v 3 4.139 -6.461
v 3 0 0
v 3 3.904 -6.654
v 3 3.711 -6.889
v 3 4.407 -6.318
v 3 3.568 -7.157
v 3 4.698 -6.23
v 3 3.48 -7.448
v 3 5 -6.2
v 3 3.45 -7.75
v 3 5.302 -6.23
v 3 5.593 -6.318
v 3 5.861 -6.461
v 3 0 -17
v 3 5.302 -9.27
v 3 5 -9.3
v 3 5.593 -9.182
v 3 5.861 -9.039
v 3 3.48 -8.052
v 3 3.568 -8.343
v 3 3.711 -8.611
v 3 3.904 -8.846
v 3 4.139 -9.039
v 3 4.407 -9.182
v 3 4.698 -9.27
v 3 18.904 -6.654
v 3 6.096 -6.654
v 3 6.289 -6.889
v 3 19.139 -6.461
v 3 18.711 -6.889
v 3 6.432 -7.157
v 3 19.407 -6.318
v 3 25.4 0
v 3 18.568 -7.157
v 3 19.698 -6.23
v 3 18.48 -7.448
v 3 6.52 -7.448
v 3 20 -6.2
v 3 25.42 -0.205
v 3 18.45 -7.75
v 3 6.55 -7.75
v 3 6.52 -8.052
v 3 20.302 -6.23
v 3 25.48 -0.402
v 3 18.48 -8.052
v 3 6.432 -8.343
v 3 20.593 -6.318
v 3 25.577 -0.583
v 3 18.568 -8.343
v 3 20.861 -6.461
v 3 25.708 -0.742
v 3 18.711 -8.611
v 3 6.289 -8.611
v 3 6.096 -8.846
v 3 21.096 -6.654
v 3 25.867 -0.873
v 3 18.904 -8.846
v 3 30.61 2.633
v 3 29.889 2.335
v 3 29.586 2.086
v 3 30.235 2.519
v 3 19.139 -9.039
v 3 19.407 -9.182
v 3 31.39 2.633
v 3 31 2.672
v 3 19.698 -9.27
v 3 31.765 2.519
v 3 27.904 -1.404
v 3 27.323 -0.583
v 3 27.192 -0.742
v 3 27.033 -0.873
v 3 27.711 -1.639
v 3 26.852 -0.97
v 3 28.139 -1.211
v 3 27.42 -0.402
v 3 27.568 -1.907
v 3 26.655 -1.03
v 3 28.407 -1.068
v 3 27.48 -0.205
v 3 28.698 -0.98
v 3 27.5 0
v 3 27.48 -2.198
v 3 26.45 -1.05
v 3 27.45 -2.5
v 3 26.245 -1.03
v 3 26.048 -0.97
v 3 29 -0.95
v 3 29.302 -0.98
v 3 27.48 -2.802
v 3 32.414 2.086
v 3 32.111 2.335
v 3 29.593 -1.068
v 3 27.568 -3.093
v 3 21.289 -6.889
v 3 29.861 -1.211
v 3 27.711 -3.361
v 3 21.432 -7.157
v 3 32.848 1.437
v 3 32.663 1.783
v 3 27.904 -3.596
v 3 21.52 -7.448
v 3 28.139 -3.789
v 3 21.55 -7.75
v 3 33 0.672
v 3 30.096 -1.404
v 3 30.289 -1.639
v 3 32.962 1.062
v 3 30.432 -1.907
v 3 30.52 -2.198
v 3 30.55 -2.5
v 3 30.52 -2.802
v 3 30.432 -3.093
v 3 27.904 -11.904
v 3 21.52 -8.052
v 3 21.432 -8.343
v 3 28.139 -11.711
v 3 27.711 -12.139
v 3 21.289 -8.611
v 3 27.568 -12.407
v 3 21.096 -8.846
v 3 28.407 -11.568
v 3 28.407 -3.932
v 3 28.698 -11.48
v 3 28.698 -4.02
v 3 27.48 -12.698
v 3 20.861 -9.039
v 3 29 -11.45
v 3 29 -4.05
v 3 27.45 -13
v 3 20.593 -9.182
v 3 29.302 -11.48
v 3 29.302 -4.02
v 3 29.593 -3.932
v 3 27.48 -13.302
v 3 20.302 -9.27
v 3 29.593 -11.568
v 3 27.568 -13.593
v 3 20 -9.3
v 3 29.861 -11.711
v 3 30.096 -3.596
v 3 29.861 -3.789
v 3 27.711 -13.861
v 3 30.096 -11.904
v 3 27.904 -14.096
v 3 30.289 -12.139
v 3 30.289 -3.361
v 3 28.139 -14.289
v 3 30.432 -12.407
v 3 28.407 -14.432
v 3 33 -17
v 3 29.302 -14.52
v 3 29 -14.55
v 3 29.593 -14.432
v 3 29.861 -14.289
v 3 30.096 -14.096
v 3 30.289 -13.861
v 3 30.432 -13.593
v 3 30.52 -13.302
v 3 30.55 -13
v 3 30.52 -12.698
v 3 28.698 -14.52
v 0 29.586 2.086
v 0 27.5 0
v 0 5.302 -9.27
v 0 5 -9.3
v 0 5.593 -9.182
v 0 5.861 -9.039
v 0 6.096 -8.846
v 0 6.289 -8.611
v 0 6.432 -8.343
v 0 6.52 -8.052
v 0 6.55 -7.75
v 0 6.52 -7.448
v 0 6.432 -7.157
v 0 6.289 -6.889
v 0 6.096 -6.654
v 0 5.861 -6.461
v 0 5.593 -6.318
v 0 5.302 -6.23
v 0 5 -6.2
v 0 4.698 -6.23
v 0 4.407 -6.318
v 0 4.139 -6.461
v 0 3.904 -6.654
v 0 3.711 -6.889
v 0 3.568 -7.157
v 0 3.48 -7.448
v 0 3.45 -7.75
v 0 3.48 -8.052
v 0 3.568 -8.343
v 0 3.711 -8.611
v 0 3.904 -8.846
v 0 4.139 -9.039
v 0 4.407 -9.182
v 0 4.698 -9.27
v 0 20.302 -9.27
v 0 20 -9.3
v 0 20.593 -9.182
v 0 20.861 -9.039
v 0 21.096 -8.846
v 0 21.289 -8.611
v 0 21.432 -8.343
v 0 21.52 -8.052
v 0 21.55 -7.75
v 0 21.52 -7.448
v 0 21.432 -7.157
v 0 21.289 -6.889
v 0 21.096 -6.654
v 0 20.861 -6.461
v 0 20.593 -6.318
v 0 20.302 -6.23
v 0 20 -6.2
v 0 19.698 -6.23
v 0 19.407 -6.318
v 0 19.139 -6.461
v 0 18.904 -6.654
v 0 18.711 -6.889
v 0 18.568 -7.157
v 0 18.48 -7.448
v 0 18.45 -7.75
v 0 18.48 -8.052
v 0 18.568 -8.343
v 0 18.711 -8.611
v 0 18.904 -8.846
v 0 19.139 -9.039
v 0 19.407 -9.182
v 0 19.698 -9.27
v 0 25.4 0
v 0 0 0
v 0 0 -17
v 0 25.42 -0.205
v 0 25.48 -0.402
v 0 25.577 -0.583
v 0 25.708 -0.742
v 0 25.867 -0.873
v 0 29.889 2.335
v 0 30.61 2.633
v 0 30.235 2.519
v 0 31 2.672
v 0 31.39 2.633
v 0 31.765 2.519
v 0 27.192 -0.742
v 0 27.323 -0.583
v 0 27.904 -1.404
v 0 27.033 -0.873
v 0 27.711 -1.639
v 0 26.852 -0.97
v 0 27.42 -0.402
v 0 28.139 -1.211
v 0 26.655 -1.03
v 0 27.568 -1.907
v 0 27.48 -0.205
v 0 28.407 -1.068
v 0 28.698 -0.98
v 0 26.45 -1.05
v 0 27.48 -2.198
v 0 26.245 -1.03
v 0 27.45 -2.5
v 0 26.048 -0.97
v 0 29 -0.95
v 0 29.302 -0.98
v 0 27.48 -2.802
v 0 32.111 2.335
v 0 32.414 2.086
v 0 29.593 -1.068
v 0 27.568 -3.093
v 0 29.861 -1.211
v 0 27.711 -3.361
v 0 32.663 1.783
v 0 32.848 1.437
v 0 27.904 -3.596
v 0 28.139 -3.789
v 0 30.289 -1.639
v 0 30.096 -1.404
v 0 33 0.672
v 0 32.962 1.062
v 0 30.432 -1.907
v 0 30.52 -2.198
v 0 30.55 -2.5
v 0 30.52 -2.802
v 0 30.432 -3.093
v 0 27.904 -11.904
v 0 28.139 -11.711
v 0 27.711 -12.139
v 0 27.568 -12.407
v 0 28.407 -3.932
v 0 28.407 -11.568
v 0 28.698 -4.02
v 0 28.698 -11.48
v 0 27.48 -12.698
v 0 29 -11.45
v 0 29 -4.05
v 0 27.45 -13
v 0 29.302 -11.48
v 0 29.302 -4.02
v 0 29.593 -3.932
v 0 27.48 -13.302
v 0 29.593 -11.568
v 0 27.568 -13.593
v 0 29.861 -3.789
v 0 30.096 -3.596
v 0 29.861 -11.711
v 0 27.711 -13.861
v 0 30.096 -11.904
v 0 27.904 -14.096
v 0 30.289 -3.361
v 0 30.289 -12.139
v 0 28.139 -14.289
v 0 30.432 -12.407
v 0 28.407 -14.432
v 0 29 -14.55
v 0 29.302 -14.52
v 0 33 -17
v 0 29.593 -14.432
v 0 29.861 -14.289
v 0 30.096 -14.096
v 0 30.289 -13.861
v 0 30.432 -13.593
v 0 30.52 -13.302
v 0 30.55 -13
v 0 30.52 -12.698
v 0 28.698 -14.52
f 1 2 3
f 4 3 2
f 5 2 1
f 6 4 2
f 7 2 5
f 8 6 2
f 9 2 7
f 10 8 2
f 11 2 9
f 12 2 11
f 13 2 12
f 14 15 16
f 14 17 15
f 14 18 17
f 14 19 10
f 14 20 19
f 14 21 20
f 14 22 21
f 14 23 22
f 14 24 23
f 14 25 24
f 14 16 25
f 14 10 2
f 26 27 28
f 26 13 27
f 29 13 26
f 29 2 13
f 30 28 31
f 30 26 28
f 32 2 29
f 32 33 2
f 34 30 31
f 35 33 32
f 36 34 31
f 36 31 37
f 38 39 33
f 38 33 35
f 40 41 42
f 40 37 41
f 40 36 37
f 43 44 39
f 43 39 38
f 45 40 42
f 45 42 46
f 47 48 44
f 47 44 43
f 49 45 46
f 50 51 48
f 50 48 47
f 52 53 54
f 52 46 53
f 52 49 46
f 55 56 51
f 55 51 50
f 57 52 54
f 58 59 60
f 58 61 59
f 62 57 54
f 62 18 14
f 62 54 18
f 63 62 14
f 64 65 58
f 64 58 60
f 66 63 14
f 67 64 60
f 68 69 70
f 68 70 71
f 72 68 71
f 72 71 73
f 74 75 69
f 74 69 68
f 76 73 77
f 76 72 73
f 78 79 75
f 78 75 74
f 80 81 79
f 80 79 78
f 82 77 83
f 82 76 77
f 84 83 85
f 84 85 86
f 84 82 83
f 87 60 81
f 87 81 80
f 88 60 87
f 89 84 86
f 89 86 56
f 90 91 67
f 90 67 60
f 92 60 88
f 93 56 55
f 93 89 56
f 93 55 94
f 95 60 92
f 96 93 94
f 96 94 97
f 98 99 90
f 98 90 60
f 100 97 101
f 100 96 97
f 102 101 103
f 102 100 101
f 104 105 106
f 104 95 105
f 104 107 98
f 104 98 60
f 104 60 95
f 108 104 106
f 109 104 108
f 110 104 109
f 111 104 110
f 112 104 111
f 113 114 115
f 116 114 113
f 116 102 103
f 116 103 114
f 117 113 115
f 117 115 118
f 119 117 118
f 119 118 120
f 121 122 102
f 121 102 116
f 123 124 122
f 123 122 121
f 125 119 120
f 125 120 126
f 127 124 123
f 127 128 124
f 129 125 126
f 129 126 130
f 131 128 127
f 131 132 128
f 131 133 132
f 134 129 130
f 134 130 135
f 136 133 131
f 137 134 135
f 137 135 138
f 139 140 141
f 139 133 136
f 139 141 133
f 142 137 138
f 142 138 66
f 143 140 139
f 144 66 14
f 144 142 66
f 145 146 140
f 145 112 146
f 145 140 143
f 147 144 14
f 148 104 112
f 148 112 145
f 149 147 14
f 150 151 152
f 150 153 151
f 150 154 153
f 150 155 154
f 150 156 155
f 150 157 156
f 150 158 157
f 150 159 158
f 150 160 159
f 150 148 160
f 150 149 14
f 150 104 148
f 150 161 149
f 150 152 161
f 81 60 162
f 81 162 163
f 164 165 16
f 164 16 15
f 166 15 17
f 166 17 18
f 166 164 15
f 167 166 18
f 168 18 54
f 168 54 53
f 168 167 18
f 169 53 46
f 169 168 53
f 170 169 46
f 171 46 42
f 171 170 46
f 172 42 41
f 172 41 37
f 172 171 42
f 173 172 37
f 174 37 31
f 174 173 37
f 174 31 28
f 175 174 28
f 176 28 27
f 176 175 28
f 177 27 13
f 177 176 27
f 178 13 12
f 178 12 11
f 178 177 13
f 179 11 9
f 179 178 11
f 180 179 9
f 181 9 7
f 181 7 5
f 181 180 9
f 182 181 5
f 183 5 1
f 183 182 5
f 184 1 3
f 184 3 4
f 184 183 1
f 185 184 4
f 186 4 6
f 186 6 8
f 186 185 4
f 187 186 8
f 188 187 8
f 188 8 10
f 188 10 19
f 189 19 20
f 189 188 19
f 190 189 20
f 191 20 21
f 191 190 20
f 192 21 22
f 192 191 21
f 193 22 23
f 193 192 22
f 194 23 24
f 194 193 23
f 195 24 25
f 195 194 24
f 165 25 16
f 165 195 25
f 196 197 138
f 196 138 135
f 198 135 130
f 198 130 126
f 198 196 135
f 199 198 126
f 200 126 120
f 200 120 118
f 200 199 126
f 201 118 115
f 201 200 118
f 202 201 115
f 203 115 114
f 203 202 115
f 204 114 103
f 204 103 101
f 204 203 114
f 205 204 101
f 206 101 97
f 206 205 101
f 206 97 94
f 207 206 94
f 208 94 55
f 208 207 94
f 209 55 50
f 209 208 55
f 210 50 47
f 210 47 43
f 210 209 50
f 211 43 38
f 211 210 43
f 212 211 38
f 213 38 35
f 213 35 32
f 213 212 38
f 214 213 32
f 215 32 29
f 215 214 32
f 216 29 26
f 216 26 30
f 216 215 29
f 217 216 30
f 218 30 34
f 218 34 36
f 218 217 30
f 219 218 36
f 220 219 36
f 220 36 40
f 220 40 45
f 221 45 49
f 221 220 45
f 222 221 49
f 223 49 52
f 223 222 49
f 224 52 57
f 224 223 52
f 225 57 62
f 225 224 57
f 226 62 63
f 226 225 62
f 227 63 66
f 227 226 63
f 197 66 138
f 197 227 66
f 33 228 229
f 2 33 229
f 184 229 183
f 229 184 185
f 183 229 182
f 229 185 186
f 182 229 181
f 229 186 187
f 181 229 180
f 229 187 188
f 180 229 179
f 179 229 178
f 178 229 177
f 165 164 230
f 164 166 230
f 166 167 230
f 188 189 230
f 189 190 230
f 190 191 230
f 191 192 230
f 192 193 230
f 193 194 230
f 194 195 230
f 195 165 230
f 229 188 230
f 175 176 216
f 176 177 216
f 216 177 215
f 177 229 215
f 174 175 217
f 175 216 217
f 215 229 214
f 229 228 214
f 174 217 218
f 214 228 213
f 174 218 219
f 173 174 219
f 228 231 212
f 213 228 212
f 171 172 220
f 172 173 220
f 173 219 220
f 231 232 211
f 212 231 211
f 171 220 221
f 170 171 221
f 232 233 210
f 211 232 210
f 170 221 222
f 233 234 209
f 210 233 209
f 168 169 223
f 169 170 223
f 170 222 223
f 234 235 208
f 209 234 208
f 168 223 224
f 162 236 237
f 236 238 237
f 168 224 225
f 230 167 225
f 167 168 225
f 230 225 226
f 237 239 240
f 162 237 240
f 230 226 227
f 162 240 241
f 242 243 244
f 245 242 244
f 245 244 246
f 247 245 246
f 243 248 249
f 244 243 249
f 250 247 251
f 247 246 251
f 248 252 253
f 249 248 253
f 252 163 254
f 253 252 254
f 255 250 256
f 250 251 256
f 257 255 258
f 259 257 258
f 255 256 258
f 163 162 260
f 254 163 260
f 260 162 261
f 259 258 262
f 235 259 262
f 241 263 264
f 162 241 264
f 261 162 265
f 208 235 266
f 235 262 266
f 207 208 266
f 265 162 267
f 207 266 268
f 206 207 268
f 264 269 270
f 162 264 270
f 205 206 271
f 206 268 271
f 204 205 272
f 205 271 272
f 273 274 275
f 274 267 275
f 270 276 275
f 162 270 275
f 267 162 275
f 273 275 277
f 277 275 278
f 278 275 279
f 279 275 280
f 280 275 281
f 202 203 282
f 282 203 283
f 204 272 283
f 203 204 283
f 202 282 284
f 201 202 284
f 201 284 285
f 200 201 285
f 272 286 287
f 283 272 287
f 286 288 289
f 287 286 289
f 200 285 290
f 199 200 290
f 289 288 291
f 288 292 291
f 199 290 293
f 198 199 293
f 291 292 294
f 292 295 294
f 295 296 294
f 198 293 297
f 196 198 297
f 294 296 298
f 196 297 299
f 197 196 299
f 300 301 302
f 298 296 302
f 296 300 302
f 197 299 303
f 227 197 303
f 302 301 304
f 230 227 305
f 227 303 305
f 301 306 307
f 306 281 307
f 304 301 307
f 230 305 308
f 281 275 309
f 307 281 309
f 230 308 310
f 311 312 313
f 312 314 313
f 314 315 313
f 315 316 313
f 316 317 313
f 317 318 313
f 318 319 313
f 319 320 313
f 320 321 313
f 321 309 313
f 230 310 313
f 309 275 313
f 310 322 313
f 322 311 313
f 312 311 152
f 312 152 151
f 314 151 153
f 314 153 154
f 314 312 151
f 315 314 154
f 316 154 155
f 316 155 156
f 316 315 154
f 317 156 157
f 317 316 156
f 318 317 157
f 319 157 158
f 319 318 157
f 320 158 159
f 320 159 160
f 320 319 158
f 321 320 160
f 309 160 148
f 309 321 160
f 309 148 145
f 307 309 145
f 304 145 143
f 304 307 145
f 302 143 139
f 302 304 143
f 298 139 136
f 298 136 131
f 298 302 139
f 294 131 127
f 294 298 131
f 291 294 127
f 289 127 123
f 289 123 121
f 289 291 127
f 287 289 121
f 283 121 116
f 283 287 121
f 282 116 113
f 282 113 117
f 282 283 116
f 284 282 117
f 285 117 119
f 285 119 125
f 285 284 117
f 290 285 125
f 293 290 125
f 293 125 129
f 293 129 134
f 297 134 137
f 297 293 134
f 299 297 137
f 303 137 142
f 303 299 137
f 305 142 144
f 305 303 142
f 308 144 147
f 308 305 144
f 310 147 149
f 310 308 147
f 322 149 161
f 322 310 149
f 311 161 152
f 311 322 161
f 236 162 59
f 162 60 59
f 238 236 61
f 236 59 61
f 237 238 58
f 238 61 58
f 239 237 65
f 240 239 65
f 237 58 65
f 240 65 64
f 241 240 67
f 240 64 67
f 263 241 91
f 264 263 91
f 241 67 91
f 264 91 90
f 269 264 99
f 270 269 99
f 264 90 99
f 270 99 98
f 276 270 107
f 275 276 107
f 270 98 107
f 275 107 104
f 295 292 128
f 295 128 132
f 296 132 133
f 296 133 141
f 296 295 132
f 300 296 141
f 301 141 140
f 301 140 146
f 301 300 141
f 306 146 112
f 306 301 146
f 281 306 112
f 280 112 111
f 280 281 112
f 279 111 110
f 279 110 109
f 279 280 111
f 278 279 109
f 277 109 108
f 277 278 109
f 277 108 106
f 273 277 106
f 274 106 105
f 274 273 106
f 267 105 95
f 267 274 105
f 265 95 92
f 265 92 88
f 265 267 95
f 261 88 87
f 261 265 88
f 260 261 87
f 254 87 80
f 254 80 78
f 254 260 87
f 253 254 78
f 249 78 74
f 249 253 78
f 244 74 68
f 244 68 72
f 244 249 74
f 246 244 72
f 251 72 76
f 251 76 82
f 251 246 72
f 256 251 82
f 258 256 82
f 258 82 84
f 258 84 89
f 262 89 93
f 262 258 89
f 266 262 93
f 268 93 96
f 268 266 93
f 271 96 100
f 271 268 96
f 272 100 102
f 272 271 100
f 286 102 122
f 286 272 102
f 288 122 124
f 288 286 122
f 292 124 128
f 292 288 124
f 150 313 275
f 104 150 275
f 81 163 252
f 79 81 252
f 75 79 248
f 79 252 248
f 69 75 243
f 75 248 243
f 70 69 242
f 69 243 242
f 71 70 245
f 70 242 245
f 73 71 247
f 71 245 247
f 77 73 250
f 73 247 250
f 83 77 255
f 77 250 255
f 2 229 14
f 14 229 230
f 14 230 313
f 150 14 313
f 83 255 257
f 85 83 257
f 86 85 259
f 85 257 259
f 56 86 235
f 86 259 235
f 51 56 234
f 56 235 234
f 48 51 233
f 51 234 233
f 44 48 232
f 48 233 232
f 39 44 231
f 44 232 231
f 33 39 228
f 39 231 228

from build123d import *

# Parameters (mm, degrees)
SKETCH_1_R      = 1.55
EXTRUDE_1_DEPTH = 3
FILLET_1_R      = 2


with BuildPart() as part:
    # 草图1 → 凸台-拉伸1 (new body)
    with BuildSketch(Plane(origin=(0, 0, 0), x_dir=(0, 0, -1), z_dir=(1, 0, 0))):
        with BuildLine():
            Line((0, 25.4), (0, 0))
            Line((0, 0), (17, 0))
            Line((17, 0), (17, 33))
            Line((17, 33), (-5.5, 33))
            Line((-5.5, 33), (0, 27.5))
            ThreePointArc((0, 27.5), (0.74246212, 27.19246212), (1.05, 26.45))
            ThreePointArc((1.05, 26.45), (0.74246212, 25.70753788), (0, 25.4))
        make_face()
        with Locations((7.75, 5)):
            Circle(SKETCH_1_R, mode=Mode.SUBTRACT)
        with Locations((2.5, 29)):
            Circle(SKETCH_1_R, mode=Mode.SUBTRACT)
        with Locations((7.75, 20)):
            Circle(SKETCH_1_R, mode=Mode.SUBTRACT)
        with Locations((13, 29)):
            Circle(SKETCH_1_R, mode=Mode.SUBTRACT)
    extrude(amount=EXTRUDE_1_DEPTH)

    # 圆角1
    fillet_1_edges = [part.edges().sort_by_distance(p)[0] for p in [
        (1.5, 33, 5.5),
    ]]
    fillet(fillet_1_edges, radius=FILLET_1_R)


solid = part.part
